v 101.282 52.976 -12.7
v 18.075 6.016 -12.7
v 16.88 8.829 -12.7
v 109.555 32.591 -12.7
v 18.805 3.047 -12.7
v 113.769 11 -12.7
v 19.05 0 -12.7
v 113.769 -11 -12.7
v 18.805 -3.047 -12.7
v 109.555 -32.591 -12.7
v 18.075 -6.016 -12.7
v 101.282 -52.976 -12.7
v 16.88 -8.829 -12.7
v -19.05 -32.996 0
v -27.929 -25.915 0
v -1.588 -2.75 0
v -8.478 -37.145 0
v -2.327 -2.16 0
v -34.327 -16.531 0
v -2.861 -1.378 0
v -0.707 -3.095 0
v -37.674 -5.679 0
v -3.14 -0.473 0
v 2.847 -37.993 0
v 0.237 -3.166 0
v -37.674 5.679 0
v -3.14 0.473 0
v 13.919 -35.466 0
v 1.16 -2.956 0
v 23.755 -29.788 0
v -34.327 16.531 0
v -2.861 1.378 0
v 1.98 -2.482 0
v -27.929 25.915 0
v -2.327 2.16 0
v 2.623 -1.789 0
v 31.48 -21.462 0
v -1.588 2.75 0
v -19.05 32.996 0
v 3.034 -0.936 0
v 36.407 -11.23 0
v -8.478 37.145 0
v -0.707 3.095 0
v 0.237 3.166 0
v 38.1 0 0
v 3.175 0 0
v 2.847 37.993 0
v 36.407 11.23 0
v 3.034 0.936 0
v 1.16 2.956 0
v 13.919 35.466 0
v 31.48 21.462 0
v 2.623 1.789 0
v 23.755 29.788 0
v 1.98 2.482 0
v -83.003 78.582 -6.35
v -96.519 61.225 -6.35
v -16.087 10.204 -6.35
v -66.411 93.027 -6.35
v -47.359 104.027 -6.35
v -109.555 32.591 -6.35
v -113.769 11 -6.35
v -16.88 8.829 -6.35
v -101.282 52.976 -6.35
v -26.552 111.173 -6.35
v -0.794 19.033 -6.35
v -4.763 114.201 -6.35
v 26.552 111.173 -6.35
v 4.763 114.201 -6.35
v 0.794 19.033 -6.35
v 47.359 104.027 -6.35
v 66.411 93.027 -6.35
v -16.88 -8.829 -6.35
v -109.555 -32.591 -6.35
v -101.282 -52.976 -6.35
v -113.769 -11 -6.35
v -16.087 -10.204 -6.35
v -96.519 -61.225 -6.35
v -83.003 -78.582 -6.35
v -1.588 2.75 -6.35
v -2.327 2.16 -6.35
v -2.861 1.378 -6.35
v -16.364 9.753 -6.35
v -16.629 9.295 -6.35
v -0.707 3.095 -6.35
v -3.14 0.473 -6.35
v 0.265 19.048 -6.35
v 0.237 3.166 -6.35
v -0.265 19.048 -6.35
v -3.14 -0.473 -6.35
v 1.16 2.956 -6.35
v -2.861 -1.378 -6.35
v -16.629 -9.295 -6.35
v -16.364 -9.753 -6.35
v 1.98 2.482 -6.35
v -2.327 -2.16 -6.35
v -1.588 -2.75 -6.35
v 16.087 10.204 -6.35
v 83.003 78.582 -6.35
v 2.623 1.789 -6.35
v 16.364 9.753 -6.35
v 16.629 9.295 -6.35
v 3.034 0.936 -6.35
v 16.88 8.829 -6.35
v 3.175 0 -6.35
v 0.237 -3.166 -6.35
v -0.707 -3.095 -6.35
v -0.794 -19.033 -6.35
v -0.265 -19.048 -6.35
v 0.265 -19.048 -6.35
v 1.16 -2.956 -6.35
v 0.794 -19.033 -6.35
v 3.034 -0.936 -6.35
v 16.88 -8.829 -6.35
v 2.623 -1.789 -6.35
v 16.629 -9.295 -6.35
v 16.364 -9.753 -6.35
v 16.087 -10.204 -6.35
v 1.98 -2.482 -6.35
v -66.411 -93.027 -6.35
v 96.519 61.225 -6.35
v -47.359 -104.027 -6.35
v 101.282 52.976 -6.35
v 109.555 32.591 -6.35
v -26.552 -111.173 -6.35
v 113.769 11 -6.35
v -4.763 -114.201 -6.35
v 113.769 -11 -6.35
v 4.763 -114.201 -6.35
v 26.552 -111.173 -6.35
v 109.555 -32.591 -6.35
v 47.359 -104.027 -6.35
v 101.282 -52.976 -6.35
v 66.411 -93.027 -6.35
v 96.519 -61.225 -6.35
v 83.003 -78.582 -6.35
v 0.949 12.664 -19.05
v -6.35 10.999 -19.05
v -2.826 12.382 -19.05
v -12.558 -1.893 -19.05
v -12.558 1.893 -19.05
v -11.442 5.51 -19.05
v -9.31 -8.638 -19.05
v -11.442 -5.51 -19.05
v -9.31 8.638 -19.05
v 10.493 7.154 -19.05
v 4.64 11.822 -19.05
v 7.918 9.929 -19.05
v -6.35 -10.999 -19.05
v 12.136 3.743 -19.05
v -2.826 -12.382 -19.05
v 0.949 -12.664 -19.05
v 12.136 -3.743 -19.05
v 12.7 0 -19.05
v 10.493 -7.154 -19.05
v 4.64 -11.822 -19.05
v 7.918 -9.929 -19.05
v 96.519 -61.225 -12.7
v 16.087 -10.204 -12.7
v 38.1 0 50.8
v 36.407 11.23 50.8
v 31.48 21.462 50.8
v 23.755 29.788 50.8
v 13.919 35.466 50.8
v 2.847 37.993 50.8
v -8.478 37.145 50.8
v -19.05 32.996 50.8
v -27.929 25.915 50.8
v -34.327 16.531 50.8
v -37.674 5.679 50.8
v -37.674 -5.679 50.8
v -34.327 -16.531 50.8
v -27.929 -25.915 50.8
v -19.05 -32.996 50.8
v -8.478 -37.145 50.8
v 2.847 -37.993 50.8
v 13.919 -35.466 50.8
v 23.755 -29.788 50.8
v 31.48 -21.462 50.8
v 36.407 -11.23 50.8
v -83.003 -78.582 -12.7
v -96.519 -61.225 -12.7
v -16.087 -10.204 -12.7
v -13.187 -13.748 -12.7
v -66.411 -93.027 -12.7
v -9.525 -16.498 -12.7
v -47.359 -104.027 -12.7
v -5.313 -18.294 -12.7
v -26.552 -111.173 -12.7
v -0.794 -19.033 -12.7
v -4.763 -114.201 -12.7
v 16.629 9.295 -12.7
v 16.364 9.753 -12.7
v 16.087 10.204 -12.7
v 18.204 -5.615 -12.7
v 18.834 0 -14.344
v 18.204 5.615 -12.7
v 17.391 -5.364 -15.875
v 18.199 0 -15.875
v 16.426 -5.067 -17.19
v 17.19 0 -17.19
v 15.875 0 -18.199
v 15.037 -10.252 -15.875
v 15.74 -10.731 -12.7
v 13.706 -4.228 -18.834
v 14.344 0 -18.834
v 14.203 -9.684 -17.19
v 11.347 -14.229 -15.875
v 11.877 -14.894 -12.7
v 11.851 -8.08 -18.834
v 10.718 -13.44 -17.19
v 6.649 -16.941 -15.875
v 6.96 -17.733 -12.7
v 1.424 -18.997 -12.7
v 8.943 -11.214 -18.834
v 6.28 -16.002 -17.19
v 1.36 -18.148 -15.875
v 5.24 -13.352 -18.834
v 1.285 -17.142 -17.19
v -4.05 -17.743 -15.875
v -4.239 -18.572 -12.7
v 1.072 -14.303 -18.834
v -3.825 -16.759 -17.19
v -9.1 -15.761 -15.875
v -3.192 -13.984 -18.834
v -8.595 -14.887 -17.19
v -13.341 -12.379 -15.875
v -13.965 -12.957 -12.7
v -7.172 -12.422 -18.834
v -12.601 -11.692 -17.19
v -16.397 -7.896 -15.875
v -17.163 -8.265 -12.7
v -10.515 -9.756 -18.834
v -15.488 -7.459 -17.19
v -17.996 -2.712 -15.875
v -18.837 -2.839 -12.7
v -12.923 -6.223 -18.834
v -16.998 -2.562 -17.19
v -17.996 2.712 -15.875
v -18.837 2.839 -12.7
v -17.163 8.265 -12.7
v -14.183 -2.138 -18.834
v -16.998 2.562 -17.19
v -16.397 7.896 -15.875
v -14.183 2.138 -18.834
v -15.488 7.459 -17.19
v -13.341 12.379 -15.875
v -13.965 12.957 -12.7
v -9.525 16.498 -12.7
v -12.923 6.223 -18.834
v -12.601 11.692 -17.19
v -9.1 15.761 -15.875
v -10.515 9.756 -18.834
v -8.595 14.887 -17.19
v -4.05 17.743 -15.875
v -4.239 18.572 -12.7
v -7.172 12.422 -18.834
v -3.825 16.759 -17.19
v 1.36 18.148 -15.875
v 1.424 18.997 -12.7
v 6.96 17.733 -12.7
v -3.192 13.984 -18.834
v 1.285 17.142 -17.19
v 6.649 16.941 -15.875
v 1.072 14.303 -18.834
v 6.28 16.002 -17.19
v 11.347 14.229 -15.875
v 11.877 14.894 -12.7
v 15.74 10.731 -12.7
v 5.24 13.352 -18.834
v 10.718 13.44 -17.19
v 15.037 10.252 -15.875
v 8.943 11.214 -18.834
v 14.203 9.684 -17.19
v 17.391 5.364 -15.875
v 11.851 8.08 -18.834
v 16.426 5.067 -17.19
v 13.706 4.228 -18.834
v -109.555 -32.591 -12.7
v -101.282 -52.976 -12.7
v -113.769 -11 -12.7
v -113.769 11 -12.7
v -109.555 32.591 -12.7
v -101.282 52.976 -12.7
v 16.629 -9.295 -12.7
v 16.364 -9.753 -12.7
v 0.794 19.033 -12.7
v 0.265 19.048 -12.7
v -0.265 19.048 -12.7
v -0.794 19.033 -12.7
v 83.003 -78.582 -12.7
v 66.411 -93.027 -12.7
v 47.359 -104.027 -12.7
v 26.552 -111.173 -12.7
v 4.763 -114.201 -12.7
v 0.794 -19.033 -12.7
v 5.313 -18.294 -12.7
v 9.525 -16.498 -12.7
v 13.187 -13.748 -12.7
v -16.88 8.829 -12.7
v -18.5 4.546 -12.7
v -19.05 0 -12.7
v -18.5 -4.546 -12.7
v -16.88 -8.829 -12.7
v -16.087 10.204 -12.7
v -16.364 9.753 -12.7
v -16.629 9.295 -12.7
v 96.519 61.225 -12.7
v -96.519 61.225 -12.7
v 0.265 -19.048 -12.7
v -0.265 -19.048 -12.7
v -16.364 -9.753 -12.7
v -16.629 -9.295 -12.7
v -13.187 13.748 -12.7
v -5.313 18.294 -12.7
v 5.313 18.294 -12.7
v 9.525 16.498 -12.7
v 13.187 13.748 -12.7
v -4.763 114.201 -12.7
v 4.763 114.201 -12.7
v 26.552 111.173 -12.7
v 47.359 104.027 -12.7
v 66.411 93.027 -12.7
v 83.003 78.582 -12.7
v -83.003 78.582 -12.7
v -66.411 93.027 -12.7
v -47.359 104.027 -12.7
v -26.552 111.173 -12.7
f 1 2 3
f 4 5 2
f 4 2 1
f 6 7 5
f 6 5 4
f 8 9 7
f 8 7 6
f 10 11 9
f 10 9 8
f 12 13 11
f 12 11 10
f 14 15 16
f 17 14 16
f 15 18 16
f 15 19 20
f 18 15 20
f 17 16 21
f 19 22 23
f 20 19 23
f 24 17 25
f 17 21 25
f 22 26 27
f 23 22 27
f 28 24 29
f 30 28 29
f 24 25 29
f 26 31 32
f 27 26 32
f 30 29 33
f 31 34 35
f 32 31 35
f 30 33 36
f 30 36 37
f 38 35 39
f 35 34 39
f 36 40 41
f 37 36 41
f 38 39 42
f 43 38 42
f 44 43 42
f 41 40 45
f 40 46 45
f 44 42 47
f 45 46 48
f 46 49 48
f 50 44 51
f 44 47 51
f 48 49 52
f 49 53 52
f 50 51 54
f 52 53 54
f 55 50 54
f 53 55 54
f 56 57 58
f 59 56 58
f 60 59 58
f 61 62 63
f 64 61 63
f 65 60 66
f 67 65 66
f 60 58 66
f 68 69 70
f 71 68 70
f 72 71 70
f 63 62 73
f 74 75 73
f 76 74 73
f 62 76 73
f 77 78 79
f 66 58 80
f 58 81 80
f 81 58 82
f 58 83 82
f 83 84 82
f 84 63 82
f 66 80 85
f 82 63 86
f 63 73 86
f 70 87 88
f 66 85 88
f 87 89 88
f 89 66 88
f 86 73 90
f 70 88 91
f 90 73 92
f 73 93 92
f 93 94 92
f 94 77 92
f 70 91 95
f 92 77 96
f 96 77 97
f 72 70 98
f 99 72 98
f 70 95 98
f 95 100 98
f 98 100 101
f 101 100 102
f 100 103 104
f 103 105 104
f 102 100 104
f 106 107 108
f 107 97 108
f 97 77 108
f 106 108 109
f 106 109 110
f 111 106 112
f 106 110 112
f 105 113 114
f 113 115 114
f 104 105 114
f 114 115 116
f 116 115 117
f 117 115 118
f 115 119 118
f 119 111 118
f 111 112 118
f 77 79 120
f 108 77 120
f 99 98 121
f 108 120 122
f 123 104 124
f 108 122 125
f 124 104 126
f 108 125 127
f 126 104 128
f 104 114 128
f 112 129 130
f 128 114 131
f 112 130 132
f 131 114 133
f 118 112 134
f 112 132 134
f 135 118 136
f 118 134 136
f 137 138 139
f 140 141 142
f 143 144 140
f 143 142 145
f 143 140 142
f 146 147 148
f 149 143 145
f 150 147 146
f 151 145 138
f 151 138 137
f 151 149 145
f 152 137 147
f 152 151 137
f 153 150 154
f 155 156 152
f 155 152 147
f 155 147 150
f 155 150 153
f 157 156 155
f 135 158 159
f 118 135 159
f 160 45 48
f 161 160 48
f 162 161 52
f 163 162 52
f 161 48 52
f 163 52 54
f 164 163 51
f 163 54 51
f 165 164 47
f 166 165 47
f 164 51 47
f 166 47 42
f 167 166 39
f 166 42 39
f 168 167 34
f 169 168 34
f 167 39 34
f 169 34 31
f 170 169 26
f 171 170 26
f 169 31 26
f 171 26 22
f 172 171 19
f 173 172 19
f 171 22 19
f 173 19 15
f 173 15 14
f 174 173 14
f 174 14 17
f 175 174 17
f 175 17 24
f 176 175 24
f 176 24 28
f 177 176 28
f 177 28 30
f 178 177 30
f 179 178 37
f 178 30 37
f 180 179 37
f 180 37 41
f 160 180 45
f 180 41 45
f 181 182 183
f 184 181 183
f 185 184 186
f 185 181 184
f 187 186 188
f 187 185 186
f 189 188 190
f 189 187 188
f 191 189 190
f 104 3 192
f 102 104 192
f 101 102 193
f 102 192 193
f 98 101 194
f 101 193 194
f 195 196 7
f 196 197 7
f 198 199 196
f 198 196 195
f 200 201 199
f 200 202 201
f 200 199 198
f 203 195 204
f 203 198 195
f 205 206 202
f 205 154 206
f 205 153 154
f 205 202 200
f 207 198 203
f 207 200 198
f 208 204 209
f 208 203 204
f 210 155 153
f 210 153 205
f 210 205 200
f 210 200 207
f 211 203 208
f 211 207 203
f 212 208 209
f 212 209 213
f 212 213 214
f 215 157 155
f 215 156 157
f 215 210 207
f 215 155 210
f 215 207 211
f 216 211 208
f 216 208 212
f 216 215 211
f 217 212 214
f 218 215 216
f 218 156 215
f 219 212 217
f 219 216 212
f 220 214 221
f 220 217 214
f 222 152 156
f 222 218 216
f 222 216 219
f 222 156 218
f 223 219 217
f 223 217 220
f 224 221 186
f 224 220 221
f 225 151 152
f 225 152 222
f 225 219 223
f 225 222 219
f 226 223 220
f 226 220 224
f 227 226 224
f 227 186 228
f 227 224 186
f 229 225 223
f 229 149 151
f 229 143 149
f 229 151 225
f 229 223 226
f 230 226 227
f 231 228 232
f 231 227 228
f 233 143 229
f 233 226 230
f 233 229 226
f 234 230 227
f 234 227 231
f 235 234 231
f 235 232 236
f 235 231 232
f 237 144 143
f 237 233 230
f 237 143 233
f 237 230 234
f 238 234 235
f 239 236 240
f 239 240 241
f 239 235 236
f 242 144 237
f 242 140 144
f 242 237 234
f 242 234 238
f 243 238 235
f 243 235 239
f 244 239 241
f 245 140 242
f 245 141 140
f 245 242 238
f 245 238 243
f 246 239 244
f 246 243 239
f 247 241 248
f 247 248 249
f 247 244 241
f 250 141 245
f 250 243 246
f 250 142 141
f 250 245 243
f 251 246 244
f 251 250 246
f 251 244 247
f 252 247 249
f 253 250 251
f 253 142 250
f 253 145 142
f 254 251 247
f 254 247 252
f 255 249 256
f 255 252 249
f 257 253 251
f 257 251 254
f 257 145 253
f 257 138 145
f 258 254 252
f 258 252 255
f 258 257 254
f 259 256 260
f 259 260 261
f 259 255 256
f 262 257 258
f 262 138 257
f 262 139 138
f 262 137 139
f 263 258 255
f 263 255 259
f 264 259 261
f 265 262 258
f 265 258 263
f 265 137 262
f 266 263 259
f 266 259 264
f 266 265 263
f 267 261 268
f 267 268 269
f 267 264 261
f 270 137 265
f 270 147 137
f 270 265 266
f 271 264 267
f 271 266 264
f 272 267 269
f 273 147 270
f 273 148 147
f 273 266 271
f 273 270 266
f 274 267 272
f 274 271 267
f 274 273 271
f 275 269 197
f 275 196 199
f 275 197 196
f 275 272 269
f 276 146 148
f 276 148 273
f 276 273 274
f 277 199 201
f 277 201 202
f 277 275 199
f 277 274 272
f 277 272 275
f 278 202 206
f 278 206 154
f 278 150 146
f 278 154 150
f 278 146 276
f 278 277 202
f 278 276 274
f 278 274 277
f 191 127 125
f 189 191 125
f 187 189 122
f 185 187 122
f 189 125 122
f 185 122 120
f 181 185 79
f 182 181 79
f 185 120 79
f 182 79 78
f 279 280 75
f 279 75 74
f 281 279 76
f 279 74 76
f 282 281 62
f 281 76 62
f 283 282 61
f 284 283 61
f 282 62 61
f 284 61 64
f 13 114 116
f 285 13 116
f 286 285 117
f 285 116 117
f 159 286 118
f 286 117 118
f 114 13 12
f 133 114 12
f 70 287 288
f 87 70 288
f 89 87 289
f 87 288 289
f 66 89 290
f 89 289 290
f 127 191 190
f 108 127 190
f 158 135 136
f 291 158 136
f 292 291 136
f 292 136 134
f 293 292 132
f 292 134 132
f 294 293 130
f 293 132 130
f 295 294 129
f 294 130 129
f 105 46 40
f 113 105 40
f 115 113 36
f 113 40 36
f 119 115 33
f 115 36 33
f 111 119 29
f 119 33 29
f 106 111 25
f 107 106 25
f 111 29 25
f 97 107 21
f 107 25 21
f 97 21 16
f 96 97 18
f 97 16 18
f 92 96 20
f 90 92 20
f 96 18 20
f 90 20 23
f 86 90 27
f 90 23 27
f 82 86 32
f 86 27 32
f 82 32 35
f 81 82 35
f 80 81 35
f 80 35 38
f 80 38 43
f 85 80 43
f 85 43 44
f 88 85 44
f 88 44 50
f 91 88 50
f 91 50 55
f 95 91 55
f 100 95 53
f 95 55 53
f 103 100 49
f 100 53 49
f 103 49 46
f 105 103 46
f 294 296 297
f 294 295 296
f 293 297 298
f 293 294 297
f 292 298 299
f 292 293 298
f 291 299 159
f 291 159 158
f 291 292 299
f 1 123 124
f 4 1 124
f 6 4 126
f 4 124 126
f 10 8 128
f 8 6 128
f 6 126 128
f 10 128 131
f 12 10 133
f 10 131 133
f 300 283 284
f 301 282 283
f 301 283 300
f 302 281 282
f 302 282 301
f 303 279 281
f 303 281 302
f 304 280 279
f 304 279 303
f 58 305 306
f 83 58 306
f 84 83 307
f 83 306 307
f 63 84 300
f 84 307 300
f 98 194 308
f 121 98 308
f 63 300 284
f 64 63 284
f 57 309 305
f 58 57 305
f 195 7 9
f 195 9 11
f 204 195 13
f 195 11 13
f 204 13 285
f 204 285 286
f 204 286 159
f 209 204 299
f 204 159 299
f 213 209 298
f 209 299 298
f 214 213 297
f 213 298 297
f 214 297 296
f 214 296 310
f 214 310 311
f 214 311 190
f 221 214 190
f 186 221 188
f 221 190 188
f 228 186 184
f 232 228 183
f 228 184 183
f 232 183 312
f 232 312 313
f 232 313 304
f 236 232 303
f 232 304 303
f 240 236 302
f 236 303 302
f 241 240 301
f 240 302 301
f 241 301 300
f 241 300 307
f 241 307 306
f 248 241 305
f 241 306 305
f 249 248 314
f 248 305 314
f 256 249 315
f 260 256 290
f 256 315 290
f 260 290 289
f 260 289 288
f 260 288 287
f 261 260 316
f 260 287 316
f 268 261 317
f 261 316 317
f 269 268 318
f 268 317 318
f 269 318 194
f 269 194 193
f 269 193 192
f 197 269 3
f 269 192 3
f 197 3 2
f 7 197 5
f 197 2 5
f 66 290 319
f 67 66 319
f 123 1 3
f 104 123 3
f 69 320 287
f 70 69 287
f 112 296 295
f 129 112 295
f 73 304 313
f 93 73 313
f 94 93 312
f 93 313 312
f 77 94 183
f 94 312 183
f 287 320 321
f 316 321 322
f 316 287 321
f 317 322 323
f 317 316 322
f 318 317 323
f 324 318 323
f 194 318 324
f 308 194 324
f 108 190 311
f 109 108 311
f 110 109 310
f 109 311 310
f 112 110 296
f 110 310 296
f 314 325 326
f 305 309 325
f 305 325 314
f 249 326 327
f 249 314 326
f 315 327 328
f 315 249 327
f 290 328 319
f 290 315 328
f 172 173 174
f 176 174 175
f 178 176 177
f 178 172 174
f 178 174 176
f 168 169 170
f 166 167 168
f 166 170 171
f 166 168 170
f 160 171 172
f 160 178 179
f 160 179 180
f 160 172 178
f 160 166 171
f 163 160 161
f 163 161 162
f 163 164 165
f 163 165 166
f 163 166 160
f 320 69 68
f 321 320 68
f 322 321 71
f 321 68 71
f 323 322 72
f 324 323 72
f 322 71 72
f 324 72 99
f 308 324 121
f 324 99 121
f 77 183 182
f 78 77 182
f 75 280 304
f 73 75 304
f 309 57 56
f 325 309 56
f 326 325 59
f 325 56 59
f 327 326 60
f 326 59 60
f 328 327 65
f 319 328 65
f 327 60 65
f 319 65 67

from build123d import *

# Parameters (mm, degrees)
F0_R            = 38.1
F1_DEPTH        = 50.8
F2_R            = 3.175
F3_DEPTH        = 6.35
F4_R            = 114.3
F5_DEPTH        = 6.35
F7_DEPTH        = 6.35
F7_COPIES_COUNT = 5
F7_COPIES_ANGLE = 240
F8_R            = 19.05
F9_DEPTH        = 6.35
F10_R           = 6.34999


# Not quite as in the source:
# - a fillet or chamfer is up to 0.001 mm smaller than in the source, because OpenCascade refuses the exact size
# - a pattern or mirror of a feature is missing from the dataset's text; its kind, count and spacing are read off the source's solid


with BuildPart() as f1:
    # F0 (on Top) → F1 (new body)
    with BuildSketch(Plane.XY):
        Circle(F0_R)
    extrude(amount=F1_DEPTH)

    # F2 (on face) → F3 (join)
    with BuildSketch(Plane(origin=(0, 0, 0), x_dir=(1, 0, 0), z_dir=(0, 0, -1))):
        Circle(F2_R)
    extrude(amount=F3_DEPTH)

    # F4 (on face) → F5 (join)
    with BuildSketch(Plane(origin=(0, 0, -6.35), x_dir=(1, 0, 0), z_dir=(0, 0, -1))):
        Circle(F4_R)
    extrude(amount=F5_DEPTH)

    # F6 (on face) → F7 (cut, through all)
    with BuildSketch(Plane(origin=(0, 0, -12.7), x_dir=(1, 0, 0), z_dir=(0, 0, -1))):
        with BuildLine():
            Line((16.880331728, 8.8293205148), (101.2819903679, 52.9759230889))
            ThreePointArc((101.2819903679, 52.9759230889), (98.9867036526, 57.15), (96.5194903679, 61.22481506))
            Line((96.5194903679, 61.22481506), (16.086581728, 10.2041358433))
            ThreePointArc((16.086581728, 10.2041358433), (16.4977839421, 9.525), (16.880331728, 8.8293205148))
        make_face()
        with BuildLine():
            ThreePointArc((96.5194903679, -61.22481506), (98.9867036526, -57.15), (101.2819903679, -52.9759230889))
            Line((101.2819903679, -52.9759230889), (16.880331728, -8.8293205148))
            ThreePointArc((16.880331728, -8.8293205148), (16.4977839421, -9.525), (16.086581728, -10.2041358433))
            Line((16.086581728, -10.2041358433), (96.5194903679, -61.22481506))
        make_face()
    f7 = extrude(amount=-F7_DEPTH, mode=Mode.SUBTRACT)

    # F7_copies: F7 ×5 about axis
    f7_copies_axis = Axis((0, 0, 0), (0, 0, 1))
    for i in range(1, F7_COPIES_COUNT):
        add(f7.rotate(f7_copies_axis, i * F7_COPIES_ANGLE / (F7_COPIES_COUNT - 1)), mode=Mode.SUBTRACT)

    # F8 (on face) → F9 (join)
    with BuildSketch(Plane(origin=(0, 0, -12.7), x_dir=(1, 0, 0), z_dir=(0, 0, -1))):
        Circle(F8_R)
    extrude(amount=F9_DEPTH)

    # F10 (radius 6.35 in the source; OpenCascade refuses exactly that, so slightly less here)
    f10_edges = [f1.edges().sort_by_distance(p)[0] for p in [
        (-19.05, 0, -19.05),
    ]]
    fillet(f10_edges, radius=F10_R)


solid = f1.part
